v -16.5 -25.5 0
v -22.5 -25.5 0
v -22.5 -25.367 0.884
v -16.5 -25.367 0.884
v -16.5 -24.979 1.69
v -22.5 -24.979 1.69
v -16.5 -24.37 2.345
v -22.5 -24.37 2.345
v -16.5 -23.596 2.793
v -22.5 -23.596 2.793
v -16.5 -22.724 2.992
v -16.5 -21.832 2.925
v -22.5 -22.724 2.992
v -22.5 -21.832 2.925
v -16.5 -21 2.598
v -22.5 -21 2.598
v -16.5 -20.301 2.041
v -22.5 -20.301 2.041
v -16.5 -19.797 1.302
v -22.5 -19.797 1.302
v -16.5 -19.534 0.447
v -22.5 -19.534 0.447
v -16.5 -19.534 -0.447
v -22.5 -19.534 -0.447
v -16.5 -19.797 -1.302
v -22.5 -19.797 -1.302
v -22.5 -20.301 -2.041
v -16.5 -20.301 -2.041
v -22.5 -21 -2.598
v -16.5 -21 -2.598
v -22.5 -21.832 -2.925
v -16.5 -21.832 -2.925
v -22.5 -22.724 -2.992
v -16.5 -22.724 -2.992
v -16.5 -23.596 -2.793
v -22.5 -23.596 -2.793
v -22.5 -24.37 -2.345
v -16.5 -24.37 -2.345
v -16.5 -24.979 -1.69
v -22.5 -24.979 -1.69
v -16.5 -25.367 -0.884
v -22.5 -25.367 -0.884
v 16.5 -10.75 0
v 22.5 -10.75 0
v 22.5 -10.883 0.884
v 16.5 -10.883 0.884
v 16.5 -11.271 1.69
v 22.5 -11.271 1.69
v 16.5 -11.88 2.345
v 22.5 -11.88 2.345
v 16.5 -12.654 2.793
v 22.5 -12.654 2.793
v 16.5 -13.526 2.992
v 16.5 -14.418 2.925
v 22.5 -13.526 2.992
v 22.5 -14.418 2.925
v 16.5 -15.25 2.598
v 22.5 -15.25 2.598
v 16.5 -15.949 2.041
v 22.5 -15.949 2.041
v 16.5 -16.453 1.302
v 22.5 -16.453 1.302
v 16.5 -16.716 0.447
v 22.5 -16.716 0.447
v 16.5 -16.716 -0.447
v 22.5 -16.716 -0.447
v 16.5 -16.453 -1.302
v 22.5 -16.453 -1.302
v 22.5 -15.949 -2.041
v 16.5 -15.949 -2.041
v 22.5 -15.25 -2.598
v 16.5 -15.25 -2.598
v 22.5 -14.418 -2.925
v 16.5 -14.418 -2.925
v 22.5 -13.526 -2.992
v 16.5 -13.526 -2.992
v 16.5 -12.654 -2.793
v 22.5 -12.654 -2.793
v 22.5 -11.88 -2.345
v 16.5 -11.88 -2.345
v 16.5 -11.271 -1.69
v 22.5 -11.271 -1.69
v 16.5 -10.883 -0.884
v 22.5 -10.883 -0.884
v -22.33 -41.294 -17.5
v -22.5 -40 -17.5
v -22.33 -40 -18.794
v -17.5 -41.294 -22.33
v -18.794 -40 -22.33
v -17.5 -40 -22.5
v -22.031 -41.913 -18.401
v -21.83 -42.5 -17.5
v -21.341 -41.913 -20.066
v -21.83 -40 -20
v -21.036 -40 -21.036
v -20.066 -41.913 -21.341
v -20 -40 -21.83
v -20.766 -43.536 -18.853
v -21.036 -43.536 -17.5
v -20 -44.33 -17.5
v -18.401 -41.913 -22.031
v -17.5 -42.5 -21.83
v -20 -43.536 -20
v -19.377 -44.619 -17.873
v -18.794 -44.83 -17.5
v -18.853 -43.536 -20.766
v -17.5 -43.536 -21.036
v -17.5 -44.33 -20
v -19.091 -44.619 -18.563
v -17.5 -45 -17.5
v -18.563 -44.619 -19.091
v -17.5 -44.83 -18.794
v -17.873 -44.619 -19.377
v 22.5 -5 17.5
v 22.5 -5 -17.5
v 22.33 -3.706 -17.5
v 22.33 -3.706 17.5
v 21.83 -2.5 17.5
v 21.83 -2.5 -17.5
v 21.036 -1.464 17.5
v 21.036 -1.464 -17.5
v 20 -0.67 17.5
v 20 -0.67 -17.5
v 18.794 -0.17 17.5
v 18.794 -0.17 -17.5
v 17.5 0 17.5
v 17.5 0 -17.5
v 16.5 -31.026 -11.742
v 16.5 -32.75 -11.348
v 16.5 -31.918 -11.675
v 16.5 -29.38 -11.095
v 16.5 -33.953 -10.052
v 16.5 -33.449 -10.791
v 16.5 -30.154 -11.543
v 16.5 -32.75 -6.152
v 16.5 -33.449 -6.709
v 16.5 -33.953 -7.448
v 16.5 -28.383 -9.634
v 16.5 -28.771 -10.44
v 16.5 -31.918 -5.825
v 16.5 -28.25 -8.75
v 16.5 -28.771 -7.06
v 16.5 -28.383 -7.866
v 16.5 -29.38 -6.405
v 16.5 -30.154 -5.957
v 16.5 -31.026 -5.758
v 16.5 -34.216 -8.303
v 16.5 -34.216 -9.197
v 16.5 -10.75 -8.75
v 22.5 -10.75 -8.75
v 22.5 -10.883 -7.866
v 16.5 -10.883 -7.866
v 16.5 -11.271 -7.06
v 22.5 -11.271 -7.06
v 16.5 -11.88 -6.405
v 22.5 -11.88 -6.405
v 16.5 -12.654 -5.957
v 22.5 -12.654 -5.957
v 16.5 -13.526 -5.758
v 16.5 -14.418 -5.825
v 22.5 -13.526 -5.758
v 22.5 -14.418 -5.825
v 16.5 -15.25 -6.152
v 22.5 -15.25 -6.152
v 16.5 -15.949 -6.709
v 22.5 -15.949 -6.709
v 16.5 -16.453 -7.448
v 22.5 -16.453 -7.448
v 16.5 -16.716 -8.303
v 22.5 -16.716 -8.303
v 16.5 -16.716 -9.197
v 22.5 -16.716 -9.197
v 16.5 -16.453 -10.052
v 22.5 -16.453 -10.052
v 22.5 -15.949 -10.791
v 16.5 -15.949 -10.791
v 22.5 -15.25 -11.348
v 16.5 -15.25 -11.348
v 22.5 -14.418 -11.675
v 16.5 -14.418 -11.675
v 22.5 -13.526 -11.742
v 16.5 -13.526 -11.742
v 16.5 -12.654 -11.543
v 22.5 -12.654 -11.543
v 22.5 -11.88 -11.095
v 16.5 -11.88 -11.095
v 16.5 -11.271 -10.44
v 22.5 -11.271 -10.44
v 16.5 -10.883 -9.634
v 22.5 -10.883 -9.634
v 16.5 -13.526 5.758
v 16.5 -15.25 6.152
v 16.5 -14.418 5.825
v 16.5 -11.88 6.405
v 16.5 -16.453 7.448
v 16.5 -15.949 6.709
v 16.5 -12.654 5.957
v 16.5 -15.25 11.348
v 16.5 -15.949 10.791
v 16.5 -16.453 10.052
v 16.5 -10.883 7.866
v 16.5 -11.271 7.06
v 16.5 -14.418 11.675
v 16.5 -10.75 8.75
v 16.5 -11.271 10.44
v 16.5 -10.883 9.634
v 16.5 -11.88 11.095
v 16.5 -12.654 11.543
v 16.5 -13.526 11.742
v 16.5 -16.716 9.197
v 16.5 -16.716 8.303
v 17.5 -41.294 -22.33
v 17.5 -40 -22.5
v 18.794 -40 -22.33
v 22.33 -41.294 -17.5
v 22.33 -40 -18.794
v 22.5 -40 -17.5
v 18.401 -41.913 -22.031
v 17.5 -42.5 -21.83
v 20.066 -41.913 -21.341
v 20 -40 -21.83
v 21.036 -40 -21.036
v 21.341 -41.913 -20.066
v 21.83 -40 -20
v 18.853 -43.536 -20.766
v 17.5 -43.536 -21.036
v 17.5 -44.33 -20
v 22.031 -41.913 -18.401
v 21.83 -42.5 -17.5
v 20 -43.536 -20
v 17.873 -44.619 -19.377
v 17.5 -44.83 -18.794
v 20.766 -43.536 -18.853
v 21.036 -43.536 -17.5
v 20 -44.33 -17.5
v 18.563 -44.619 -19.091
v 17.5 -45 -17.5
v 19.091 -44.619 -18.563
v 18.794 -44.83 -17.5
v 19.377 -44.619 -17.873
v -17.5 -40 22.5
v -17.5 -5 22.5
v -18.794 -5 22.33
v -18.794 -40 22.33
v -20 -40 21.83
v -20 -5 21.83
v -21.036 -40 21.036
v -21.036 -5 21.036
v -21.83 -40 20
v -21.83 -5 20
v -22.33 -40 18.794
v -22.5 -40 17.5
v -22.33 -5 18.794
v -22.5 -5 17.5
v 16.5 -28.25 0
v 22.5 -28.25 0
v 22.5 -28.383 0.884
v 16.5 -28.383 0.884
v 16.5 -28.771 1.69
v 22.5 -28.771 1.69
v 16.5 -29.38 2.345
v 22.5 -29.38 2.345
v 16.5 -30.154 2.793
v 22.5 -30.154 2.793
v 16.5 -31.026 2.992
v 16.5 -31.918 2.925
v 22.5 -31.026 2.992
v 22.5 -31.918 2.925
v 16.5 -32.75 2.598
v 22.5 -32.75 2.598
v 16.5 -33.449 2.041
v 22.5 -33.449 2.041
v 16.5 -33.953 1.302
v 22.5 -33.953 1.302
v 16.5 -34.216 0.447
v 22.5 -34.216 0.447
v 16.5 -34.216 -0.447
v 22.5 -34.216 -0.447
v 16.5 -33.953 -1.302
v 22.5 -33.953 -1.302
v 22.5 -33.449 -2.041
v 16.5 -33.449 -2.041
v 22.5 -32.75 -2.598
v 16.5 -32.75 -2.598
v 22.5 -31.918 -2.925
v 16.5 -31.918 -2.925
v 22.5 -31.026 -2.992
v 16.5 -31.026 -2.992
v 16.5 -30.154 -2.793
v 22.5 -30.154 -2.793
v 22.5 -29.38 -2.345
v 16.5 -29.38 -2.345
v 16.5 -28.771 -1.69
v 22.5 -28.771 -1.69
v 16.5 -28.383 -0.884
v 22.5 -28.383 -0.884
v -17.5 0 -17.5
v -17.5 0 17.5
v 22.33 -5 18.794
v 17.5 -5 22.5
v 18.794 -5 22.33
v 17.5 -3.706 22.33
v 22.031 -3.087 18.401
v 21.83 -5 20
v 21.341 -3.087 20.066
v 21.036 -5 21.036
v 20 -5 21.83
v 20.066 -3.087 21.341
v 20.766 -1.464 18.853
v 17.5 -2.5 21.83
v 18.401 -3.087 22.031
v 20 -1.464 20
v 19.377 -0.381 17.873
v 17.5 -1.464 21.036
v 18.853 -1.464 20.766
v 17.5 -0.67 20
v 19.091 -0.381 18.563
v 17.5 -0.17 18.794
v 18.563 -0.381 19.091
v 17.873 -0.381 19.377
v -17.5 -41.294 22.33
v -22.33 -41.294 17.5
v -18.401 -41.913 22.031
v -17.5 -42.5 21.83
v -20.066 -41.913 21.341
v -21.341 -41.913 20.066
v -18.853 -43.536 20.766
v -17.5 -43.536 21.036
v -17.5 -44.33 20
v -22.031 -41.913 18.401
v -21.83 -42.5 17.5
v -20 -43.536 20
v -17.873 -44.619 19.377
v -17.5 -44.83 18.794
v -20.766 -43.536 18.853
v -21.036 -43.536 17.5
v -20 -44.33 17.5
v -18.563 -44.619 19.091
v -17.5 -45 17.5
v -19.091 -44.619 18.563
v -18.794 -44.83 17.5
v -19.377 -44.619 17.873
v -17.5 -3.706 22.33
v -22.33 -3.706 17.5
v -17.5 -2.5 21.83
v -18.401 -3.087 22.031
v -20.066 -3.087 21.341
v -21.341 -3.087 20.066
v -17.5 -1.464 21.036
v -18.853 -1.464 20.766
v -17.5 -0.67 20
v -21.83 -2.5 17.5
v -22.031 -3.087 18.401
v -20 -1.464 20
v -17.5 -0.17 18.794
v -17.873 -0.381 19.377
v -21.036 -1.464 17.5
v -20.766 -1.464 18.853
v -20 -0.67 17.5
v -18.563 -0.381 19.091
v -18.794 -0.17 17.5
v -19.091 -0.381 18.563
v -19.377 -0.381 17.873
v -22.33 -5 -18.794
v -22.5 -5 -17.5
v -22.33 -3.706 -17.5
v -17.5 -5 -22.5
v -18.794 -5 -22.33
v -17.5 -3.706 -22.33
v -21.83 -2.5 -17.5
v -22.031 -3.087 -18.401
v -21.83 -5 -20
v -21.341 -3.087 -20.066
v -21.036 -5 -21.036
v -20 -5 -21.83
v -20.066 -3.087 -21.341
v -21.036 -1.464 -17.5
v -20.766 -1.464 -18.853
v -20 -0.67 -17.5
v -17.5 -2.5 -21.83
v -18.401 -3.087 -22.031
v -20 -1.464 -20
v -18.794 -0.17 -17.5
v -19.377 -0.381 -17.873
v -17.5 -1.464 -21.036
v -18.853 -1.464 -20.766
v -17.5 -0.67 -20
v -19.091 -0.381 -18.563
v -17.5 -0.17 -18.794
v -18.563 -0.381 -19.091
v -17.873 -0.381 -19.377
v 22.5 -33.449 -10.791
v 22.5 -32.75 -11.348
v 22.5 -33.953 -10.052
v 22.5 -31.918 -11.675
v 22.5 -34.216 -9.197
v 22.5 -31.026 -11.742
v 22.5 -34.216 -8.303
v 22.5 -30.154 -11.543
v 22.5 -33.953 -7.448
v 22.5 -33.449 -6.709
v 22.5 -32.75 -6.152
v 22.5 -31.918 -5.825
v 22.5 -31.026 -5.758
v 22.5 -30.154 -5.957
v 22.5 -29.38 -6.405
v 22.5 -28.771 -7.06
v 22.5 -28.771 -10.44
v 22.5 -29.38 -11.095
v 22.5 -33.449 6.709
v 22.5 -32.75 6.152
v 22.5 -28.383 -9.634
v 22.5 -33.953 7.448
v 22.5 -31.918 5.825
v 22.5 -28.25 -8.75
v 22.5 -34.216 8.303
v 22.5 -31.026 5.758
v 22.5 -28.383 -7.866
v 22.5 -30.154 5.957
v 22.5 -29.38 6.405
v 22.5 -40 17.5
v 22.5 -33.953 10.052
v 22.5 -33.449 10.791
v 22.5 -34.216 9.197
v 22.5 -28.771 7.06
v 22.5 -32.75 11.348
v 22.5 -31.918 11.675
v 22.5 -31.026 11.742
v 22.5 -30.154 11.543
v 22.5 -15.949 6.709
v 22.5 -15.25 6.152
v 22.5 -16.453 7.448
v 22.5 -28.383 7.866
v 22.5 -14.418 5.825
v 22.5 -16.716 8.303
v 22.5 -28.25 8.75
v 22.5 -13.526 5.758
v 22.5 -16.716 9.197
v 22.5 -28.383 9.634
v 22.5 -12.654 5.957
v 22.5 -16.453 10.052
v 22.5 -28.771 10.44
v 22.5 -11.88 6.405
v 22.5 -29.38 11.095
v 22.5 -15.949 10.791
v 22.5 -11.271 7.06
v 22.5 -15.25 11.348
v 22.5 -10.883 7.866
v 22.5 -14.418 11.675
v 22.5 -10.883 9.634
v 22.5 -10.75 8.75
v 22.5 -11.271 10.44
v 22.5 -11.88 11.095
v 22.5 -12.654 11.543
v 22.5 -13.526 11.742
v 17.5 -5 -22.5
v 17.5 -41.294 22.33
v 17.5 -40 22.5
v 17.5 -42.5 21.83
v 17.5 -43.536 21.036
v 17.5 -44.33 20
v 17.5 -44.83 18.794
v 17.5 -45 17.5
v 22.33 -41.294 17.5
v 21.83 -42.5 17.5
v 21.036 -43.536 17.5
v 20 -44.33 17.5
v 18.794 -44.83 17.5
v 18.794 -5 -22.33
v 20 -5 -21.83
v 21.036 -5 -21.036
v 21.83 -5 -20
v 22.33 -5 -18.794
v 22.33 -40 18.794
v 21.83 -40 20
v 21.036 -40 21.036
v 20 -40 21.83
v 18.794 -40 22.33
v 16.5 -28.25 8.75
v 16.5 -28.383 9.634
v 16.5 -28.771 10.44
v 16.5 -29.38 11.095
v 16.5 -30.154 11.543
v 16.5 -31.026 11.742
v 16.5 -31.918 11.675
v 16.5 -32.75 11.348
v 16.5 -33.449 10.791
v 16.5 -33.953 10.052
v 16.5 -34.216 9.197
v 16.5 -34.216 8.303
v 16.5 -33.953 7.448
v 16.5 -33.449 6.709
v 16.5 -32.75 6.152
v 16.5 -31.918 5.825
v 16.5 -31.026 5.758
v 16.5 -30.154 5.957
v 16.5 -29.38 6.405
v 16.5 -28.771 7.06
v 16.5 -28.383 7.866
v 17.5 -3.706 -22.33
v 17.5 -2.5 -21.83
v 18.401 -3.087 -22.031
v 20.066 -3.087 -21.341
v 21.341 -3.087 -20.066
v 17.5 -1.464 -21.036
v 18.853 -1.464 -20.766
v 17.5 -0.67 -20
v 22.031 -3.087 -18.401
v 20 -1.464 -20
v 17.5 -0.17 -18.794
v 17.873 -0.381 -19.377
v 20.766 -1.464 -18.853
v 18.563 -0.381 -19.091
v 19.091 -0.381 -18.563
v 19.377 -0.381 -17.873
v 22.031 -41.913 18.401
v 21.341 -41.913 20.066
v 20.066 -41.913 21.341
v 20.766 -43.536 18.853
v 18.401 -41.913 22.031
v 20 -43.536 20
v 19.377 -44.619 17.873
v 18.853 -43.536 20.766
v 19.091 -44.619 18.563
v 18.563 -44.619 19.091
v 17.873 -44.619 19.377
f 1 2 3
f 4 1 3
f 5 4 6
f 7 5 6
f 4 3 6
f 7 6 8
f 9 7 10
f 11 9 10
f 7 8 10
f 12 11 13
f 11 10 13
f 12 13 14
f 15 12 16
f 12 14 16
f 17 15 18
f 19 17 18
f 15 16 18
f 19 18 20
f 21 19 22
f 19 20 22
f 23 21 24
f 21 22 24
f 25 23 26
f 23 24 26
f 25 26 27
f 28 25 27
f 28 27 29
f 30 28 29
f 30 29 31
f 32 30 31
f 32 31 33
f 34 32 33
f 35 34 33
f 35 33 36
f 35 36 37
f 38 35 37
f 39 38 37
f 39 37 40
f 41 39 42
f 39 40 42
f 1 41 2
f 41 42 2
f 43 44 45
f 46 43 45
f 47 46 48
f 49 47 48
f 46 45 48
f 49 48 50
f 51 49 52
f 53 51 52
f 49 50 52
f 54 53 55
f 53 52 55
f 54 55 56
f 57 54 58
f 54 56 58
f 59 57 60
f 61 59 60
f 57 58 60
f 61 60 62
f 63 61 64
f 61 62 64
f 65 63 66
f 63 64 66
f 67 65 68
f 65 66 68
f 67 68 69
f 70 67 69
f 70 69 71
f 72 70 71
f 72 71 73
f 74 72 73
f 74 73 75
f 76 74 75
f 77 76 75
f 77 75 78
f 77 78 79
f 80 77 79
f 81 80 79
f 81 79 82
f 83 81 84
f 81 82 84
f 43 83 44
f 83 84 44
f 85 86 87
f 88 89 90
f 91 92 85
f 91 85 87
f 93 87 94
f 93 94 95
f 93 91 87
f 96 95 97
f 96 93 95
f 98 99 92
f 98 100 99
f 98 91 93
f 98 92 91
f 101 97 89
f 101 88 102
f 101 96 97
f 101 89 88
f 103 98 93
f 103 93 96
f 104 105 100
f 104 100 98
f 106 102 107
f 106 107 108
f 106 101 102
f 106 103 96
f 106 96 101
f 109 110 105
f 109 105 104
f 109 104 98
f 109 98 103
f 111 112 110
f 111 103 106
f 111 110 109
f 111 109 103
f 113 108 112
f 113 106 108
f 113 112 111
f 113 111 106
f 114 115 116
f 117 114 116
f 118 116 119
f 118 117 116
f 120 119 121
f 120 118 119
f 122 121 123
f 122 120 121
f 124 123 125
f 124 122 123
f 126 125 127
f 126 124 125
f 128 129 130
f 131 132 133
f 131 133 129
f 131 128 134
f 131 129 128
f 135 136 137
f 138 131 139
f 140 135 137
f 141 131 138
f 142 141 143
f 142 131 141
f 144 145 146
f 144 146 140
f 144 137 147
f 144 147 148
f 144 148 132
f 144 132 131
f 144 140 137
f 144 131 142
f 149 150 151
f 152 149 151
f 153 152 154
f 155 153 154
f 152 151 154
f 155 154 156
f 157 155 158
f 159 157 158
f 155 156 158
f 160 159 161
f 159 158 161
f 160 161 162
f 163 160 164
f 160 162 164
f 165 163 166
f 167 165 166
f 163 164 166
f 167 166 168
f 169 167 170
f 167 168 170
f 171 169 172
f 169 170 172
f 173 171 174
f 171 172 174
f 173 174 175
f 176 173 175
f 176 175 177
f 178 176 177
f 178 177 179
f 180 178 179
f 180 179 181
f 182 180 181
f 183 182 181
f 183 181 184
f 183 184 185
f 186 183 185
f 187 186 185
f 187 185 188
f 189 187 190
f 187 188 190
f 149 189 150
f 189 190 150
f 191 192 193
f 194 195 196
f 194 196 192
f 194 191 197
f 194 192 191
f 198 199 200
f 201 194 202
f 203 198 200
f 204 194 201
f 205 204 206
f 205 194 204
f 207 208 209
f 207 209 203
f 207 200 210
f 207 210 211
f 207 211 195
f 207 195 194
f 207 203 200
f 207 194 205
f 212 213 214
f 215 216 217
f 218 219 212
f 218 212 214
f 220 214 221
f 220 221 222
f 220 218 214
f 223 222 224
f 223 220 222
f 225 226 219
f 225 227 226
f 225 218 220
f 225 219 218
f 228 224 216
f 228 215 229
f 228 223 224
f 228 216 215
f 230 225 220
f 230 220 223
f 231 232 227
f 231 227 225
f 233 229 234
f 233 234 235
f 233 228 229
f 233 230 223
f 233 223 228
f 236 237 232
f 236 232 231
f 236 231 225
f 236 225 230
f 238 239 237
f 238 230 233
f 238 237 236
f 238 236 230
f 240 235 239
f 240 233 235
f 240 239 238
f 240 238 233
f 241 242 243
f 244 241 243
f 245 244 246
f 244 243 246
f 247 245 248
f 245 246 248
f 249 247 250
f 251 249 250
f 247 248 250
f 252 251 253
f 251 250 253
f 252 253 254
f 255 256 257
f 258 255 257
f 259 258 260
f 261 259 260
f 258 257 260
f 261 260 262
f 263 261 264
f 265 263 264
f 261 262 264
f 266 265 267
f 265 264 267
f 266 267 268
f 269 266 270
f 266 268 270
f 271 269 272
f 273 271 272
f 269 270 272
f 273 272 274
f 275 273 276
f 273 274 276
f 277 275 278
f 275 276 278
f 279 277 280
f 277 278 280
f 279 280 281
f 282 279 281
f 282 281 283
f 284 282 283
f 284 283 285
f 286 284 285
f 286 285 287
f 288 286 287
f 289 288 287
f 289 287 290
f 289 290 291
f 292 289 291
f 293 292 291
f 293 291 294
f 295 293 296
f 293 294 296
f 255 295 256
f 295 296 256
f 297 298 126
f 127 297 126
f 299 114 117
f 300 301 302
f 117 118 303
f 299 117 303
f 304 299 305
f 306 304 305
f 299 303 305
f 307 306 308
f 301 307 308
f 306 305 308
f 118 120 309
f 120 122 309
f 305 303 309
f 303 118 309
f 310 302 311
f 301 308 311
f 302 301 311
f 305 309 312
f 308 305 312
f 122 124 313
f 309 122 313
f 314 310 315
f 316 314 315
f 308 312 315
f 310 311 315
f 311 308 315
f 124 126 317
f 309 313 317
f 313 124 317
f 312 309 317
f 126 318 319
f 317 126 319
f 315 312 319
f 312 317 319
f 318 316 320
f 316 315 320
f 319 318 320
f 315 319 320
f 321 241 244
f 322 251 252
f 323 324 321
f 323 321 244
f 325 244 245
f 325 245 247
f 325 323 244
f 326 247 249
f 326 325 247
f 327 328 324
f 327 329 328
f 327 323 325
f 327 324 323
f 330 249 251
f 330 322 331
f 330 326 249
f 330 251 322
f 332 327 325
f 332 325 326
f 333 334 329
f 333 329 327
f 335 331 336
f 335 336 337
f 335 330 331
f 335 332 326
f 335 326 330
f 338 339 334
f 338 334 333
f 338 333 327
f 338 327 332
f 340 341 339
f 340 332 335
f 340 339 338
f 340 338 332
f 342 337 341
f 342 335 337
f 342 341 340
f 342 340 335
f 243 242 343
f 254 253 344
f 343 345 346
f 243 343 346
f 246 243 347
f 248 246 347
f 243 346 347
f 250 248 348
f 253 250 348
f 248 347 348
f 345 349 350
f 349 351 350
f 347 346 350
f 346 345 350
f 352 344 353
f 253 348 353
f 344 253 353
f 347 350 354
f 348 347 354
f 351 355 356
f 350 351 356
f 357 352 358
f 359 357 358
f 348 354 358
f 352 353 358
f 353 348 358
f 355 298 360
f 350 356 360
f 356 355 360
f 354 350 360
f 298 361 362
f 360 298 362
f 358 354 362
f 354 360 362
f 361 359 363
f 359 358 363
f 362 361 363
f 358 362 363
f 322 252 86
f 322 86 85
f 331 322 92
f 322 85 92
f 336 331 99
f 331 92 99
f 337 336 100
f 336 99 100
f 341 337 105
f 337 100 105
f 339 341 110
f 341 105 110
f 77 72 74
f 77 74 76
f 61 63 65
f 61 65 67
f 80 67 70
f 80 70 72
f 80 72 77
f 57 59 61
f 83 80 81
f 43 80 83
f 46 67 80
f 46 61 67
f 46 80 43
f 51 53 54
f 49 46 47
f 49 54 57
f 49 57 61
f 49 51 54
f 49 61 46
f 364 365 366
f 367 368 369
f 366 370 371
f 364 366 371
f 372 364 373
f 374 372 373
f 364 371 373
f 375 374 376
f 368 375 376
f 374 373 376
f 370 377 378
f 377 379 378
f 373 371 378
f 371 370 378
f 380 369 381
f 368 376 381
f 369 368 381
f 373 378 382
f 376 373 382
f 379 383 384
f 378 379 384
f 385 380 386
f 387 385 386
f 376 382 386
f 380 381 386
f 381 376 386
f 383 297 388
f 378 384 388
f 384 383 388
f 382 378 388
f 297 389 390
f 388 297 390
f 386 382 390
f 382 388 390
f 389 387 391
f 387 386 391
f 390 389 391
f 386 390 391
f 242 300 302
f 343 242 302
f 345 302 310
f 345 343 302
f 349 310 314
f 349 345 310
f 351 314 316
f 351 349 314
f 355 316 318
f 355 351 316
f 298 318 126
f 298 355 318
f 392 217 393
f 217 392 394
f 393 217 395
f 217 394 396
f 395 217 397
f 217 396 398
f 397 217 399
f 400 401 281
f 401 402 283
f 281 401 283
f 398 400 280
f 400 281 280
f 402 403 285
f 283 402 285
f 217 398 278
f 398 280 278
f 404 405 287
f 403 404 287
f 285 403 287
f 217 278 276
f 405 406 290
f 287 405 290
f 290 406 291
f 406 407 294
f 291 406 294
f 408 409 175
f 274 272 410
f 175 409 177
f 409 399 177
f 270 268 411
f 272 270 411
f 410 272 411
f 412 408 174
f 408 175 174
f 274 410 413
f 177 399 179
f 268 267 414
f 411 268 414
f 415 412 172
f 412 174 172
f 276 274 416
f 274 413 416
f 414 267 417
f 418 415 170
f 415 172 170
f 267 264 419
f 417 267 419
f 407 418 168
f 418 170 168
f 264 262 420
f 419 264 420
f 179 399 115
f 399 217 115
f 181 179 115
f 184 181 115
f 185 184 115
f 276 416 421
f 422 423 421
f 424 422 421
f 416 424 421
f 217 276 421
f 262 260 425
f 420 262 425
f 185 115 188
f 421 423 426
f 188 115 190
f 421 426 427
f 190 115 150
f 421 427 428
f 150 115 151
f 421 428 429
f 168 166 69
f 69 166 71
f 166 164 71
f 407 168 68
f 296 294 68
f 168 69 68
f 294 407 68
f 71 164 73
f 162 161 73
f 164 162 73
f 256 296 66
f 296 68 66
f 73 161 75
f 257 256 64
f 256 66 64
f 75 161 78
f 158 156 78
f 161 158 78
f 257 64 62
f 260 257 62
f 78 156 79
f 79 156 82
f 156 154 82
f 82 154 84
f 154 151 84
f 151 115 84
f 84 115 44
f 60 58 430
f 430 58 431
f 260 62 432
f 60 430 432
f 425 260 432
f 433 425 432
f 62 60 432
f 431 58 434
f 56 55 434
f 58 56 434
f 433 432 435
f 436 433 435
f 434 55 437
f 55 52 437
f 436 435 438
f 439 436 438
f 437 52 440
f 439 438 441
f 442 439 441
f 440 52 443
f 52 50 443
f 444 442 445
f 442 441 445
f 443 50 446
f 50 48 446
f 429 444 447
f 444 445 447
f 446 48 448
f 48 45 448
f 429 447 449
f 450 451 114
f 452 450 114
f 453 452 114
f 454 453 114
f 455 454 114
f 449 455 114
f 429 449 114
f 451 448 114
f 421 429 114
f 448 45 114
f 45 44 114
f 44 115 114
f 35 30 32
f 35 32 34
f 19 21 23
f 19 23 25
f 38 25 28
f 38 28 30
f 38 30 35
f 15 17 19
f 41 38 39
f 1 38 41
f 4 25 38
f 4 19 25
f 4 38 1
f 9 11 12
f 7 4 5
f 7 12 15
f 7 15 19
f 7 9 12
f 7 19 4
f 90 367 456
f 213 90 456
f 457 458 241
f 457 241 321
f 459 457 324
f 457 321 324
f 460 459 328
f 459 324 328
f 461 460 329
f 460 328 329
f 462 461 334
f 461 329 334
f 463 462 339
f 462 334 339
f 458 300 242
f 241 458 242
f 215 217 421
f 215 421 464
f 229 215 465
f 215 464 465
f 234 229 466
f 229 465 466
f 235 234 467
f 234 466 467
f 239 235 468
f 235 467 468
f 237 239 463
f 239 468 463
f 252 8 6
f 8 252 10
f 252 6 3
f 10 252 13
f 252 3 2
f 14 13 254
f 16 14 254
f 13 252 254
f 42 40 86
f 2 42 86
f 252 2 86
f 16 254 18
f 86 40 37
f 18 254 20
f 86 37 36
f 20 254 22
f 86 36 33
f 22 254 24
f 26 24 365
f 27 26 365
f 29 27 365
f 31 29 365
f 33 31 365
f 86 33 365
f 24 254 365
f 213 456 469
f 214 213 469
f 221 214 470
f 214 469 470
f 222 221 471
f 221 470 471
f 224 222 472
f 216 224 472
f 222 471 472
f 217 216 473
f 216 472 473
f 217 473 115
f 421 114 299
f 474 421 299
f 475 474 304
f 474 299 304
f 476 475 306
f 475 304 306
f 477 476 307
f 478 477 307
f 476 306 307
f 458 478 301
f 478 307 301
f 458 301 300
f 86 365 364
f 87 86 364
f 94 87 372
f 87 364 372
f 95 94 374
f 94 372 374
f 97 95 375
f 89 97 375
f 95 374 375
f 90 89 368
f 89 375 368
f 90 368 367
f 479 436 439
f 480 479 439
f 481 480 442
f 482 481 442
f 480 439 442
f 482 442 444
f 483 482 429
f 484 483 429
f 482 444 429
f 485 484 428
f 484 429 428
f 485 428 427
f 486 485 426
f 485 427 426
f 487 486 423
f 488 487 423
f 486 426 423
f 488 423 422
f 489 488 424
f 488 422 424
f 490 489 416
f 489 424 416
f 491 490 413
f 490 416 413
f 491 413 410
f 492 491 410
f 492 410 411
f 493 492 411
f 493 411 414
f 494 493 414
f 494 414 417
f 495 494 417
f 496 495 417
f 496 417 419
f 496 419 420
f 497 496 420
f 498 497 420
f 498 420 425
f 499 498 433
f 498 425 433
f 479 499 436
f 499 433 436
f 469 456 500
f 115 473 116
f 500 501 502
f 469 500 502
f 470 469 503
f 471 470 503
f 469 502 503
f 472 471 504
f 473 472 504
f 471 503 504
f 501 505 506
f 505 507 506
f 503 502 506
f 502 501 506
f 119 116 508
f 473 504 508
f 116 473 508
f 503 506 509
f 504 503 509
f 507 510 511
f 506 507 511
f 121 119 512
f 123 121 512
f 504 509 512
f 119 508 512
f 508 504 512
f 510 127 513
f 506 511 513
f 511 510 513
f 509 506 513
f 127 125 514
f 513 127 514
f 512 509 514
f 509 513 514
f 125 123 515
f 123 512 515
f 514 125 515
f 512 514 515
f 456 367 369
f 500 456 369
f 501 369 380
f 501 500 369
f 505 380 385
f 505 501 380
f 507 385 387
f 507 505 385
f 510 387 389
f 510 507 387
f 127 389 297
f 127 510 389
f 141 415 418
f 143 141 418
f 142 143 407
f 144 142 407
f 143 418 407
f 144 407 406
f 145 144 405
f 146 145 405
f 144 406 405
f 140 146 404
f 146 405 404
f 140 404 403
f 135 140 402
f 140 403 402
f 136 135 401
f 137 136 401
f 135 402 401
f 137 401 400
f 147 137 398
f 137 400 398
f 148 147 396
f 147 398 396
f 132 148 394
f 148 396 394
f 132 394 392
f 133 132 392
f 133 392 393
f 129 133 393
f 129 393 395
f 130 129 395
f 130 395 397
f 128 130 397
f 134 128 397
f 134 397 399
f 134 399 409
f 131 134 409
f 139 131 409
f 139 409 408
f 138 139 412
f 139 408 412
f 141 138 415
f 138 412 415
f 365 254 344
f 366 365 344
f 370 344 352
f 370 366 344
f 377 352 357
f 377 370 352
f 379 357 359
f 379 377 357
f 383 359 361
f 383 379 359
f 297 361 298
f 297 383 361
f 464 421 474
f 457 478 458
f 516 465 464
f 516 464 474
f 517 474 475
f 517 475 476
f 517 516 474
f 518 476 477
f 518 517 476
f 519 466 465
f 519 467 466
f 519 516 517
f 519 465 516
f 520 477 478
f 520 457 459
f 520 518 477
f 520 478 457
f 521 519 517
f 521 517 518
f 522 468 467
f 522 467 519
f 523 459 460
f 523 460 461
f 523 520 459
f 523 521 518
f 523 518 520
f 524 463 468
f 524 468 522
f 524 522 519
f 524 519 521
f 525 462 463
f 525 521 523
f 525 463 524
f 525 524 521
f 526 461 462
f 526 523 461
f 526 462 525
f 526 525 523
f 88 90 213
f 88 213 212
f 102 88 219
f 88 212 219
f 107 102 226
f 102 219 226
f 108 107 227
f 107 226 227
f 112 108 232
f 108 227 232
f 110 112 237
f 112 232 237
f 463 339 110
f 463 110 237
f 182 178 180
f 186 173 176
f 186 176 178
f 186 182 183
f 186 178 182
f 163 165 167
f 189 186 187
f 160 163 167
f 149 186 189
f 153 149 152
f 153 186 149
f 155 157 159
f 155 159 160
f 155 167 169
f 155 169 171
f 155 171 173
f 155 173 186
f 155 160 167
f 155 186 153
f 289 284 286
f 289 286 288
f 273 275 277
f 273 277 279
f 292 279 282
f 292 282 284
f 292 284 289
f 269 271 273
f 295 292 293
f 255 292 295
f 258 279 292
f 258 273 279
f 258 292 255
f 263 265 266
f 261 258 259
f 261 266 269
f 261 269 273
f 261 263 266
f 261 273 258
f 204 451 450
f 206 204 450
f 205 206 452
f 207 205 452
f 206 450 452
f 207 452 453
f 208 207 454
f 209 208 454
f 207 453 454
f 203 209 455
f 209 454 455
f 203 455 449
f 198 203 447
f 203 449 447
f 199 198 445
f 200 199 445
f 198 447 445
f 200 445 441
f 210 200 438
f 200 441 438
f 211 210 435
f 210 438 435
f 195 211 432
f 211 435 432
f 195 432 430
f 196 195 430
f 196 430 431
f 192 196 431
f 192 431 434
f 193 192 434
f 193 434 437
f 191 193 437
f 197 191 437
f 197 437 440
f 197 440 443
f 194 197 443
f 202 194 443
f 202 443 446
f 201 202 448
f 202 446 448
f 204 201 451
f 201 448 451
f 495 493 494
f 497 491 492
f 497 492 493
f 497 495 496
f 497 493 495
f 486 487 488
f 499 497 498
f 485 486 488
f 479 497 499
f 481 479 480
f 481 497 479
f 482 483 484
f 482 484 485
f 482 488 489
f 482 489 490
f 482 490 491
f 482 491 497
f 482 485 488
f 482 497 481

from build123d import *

# Parameters (mm, degrees)
F1_DEPTH = 45
F2_R     = 5
F3_R     = 5
F4_R     = 3
F5_DEPTH = 6
F6_R     = 3
F7_DEPTH = 6


with BuildPart() as f1:
    # F0 (on Front) → F1 (new body)
    with BuildSketch(Plane.XZ):
        with BuildLine():
            Line((17.5, 22.5), (-17.5, 22.5))
            ThreePointArc((-17.5, 22.5), (-21.0355339059, 21.0355339059), (-22.5, 17.5))
            Line((-22.5, 17.5), (-22.5, -17.5))
            ThreePointArc((-22.5, -17.5), (-21.0355339059, -21.0355339059), (-17.5, -22.5))
            Line((-17.5, -22.5), (17.5, -22.5))
            ThreePointArc((17.5, -22.5), (21.0355339059, -21.0355339059), (22.5, -17.5))
            Line((22.5, -17.5), (22.5, 17.5))
            ThreePointArc((22.5, 17.5), (21.0355339059, 21.0355339059), (17.5, 22.5))
        make_face()
    extrude(amount=F1_DEPTH)

    # F2
    f2_edges = [f1.edges().sort_by_distance(p)[0] for p in [
        (0, -45, 22.5),
        (-21.035534, -45, 21.035534),
        (-22.5, -45, 0),
        (-21.035534, -45, -21.035534),
        (0, -45, -22.5),
        (21.035534, -45, -21.035534),
        (22.5, -45, 0),
        (21.035534, -45, 21.035534),
    ]]
    fillet(f2_edges, radius=F2_R)

    # F3
    f3_edges = [f1.edges().sort_by_distance(p)[0] for p in [
        (0, 0, 22.5),
        (-21.035534, 0, 21.035534),
        (-22.5, 0, 0),
        (-21.035534, 0, -21.035534),
        (0, 0, -22.5),
        (21.035534, 0, -21.035534),
        (22.5, 0, 0),
        (21.035534, 0, 21.035534),
    ]]
    fillet(f3_edges, radius=F3_R)

    # F4 (on face) → F5 (cut)
    with BuildSketch(Plane(origin=(-22.5, 0, 0), x_dir=(0, -1, 0), z_dir=(-1, 0, 0))):
        with Locations((22.5, 0)):
            Circle(F4_R)
    extrude(amount=-F5_DEPTH, mode=Mode.SUBTRACT)

    # F6 (on face) → F7 (cut)
    with BuildSketch(Plane.YZ.offset(22.5)):
        with Locations((-31.25, 8.75)):
            Circle(F6_R)
        with Locations((-31.25, 0)):
            Circle(F6_R)
        with Locations((-31.25, -8.75)):
            Circle(F6_R)
        with Locations((-13.75, -8.75)):
            Circle(F6_R)
        with Locations((-13.75, 0)):
            Circle(F6_R)
        with Locations((-13.75, 8.75)):
            Circle(F6_R)
    extrude(amount=-F7_DEPTH, mode=Mode.SUBTRACT)


solid = f1.part
